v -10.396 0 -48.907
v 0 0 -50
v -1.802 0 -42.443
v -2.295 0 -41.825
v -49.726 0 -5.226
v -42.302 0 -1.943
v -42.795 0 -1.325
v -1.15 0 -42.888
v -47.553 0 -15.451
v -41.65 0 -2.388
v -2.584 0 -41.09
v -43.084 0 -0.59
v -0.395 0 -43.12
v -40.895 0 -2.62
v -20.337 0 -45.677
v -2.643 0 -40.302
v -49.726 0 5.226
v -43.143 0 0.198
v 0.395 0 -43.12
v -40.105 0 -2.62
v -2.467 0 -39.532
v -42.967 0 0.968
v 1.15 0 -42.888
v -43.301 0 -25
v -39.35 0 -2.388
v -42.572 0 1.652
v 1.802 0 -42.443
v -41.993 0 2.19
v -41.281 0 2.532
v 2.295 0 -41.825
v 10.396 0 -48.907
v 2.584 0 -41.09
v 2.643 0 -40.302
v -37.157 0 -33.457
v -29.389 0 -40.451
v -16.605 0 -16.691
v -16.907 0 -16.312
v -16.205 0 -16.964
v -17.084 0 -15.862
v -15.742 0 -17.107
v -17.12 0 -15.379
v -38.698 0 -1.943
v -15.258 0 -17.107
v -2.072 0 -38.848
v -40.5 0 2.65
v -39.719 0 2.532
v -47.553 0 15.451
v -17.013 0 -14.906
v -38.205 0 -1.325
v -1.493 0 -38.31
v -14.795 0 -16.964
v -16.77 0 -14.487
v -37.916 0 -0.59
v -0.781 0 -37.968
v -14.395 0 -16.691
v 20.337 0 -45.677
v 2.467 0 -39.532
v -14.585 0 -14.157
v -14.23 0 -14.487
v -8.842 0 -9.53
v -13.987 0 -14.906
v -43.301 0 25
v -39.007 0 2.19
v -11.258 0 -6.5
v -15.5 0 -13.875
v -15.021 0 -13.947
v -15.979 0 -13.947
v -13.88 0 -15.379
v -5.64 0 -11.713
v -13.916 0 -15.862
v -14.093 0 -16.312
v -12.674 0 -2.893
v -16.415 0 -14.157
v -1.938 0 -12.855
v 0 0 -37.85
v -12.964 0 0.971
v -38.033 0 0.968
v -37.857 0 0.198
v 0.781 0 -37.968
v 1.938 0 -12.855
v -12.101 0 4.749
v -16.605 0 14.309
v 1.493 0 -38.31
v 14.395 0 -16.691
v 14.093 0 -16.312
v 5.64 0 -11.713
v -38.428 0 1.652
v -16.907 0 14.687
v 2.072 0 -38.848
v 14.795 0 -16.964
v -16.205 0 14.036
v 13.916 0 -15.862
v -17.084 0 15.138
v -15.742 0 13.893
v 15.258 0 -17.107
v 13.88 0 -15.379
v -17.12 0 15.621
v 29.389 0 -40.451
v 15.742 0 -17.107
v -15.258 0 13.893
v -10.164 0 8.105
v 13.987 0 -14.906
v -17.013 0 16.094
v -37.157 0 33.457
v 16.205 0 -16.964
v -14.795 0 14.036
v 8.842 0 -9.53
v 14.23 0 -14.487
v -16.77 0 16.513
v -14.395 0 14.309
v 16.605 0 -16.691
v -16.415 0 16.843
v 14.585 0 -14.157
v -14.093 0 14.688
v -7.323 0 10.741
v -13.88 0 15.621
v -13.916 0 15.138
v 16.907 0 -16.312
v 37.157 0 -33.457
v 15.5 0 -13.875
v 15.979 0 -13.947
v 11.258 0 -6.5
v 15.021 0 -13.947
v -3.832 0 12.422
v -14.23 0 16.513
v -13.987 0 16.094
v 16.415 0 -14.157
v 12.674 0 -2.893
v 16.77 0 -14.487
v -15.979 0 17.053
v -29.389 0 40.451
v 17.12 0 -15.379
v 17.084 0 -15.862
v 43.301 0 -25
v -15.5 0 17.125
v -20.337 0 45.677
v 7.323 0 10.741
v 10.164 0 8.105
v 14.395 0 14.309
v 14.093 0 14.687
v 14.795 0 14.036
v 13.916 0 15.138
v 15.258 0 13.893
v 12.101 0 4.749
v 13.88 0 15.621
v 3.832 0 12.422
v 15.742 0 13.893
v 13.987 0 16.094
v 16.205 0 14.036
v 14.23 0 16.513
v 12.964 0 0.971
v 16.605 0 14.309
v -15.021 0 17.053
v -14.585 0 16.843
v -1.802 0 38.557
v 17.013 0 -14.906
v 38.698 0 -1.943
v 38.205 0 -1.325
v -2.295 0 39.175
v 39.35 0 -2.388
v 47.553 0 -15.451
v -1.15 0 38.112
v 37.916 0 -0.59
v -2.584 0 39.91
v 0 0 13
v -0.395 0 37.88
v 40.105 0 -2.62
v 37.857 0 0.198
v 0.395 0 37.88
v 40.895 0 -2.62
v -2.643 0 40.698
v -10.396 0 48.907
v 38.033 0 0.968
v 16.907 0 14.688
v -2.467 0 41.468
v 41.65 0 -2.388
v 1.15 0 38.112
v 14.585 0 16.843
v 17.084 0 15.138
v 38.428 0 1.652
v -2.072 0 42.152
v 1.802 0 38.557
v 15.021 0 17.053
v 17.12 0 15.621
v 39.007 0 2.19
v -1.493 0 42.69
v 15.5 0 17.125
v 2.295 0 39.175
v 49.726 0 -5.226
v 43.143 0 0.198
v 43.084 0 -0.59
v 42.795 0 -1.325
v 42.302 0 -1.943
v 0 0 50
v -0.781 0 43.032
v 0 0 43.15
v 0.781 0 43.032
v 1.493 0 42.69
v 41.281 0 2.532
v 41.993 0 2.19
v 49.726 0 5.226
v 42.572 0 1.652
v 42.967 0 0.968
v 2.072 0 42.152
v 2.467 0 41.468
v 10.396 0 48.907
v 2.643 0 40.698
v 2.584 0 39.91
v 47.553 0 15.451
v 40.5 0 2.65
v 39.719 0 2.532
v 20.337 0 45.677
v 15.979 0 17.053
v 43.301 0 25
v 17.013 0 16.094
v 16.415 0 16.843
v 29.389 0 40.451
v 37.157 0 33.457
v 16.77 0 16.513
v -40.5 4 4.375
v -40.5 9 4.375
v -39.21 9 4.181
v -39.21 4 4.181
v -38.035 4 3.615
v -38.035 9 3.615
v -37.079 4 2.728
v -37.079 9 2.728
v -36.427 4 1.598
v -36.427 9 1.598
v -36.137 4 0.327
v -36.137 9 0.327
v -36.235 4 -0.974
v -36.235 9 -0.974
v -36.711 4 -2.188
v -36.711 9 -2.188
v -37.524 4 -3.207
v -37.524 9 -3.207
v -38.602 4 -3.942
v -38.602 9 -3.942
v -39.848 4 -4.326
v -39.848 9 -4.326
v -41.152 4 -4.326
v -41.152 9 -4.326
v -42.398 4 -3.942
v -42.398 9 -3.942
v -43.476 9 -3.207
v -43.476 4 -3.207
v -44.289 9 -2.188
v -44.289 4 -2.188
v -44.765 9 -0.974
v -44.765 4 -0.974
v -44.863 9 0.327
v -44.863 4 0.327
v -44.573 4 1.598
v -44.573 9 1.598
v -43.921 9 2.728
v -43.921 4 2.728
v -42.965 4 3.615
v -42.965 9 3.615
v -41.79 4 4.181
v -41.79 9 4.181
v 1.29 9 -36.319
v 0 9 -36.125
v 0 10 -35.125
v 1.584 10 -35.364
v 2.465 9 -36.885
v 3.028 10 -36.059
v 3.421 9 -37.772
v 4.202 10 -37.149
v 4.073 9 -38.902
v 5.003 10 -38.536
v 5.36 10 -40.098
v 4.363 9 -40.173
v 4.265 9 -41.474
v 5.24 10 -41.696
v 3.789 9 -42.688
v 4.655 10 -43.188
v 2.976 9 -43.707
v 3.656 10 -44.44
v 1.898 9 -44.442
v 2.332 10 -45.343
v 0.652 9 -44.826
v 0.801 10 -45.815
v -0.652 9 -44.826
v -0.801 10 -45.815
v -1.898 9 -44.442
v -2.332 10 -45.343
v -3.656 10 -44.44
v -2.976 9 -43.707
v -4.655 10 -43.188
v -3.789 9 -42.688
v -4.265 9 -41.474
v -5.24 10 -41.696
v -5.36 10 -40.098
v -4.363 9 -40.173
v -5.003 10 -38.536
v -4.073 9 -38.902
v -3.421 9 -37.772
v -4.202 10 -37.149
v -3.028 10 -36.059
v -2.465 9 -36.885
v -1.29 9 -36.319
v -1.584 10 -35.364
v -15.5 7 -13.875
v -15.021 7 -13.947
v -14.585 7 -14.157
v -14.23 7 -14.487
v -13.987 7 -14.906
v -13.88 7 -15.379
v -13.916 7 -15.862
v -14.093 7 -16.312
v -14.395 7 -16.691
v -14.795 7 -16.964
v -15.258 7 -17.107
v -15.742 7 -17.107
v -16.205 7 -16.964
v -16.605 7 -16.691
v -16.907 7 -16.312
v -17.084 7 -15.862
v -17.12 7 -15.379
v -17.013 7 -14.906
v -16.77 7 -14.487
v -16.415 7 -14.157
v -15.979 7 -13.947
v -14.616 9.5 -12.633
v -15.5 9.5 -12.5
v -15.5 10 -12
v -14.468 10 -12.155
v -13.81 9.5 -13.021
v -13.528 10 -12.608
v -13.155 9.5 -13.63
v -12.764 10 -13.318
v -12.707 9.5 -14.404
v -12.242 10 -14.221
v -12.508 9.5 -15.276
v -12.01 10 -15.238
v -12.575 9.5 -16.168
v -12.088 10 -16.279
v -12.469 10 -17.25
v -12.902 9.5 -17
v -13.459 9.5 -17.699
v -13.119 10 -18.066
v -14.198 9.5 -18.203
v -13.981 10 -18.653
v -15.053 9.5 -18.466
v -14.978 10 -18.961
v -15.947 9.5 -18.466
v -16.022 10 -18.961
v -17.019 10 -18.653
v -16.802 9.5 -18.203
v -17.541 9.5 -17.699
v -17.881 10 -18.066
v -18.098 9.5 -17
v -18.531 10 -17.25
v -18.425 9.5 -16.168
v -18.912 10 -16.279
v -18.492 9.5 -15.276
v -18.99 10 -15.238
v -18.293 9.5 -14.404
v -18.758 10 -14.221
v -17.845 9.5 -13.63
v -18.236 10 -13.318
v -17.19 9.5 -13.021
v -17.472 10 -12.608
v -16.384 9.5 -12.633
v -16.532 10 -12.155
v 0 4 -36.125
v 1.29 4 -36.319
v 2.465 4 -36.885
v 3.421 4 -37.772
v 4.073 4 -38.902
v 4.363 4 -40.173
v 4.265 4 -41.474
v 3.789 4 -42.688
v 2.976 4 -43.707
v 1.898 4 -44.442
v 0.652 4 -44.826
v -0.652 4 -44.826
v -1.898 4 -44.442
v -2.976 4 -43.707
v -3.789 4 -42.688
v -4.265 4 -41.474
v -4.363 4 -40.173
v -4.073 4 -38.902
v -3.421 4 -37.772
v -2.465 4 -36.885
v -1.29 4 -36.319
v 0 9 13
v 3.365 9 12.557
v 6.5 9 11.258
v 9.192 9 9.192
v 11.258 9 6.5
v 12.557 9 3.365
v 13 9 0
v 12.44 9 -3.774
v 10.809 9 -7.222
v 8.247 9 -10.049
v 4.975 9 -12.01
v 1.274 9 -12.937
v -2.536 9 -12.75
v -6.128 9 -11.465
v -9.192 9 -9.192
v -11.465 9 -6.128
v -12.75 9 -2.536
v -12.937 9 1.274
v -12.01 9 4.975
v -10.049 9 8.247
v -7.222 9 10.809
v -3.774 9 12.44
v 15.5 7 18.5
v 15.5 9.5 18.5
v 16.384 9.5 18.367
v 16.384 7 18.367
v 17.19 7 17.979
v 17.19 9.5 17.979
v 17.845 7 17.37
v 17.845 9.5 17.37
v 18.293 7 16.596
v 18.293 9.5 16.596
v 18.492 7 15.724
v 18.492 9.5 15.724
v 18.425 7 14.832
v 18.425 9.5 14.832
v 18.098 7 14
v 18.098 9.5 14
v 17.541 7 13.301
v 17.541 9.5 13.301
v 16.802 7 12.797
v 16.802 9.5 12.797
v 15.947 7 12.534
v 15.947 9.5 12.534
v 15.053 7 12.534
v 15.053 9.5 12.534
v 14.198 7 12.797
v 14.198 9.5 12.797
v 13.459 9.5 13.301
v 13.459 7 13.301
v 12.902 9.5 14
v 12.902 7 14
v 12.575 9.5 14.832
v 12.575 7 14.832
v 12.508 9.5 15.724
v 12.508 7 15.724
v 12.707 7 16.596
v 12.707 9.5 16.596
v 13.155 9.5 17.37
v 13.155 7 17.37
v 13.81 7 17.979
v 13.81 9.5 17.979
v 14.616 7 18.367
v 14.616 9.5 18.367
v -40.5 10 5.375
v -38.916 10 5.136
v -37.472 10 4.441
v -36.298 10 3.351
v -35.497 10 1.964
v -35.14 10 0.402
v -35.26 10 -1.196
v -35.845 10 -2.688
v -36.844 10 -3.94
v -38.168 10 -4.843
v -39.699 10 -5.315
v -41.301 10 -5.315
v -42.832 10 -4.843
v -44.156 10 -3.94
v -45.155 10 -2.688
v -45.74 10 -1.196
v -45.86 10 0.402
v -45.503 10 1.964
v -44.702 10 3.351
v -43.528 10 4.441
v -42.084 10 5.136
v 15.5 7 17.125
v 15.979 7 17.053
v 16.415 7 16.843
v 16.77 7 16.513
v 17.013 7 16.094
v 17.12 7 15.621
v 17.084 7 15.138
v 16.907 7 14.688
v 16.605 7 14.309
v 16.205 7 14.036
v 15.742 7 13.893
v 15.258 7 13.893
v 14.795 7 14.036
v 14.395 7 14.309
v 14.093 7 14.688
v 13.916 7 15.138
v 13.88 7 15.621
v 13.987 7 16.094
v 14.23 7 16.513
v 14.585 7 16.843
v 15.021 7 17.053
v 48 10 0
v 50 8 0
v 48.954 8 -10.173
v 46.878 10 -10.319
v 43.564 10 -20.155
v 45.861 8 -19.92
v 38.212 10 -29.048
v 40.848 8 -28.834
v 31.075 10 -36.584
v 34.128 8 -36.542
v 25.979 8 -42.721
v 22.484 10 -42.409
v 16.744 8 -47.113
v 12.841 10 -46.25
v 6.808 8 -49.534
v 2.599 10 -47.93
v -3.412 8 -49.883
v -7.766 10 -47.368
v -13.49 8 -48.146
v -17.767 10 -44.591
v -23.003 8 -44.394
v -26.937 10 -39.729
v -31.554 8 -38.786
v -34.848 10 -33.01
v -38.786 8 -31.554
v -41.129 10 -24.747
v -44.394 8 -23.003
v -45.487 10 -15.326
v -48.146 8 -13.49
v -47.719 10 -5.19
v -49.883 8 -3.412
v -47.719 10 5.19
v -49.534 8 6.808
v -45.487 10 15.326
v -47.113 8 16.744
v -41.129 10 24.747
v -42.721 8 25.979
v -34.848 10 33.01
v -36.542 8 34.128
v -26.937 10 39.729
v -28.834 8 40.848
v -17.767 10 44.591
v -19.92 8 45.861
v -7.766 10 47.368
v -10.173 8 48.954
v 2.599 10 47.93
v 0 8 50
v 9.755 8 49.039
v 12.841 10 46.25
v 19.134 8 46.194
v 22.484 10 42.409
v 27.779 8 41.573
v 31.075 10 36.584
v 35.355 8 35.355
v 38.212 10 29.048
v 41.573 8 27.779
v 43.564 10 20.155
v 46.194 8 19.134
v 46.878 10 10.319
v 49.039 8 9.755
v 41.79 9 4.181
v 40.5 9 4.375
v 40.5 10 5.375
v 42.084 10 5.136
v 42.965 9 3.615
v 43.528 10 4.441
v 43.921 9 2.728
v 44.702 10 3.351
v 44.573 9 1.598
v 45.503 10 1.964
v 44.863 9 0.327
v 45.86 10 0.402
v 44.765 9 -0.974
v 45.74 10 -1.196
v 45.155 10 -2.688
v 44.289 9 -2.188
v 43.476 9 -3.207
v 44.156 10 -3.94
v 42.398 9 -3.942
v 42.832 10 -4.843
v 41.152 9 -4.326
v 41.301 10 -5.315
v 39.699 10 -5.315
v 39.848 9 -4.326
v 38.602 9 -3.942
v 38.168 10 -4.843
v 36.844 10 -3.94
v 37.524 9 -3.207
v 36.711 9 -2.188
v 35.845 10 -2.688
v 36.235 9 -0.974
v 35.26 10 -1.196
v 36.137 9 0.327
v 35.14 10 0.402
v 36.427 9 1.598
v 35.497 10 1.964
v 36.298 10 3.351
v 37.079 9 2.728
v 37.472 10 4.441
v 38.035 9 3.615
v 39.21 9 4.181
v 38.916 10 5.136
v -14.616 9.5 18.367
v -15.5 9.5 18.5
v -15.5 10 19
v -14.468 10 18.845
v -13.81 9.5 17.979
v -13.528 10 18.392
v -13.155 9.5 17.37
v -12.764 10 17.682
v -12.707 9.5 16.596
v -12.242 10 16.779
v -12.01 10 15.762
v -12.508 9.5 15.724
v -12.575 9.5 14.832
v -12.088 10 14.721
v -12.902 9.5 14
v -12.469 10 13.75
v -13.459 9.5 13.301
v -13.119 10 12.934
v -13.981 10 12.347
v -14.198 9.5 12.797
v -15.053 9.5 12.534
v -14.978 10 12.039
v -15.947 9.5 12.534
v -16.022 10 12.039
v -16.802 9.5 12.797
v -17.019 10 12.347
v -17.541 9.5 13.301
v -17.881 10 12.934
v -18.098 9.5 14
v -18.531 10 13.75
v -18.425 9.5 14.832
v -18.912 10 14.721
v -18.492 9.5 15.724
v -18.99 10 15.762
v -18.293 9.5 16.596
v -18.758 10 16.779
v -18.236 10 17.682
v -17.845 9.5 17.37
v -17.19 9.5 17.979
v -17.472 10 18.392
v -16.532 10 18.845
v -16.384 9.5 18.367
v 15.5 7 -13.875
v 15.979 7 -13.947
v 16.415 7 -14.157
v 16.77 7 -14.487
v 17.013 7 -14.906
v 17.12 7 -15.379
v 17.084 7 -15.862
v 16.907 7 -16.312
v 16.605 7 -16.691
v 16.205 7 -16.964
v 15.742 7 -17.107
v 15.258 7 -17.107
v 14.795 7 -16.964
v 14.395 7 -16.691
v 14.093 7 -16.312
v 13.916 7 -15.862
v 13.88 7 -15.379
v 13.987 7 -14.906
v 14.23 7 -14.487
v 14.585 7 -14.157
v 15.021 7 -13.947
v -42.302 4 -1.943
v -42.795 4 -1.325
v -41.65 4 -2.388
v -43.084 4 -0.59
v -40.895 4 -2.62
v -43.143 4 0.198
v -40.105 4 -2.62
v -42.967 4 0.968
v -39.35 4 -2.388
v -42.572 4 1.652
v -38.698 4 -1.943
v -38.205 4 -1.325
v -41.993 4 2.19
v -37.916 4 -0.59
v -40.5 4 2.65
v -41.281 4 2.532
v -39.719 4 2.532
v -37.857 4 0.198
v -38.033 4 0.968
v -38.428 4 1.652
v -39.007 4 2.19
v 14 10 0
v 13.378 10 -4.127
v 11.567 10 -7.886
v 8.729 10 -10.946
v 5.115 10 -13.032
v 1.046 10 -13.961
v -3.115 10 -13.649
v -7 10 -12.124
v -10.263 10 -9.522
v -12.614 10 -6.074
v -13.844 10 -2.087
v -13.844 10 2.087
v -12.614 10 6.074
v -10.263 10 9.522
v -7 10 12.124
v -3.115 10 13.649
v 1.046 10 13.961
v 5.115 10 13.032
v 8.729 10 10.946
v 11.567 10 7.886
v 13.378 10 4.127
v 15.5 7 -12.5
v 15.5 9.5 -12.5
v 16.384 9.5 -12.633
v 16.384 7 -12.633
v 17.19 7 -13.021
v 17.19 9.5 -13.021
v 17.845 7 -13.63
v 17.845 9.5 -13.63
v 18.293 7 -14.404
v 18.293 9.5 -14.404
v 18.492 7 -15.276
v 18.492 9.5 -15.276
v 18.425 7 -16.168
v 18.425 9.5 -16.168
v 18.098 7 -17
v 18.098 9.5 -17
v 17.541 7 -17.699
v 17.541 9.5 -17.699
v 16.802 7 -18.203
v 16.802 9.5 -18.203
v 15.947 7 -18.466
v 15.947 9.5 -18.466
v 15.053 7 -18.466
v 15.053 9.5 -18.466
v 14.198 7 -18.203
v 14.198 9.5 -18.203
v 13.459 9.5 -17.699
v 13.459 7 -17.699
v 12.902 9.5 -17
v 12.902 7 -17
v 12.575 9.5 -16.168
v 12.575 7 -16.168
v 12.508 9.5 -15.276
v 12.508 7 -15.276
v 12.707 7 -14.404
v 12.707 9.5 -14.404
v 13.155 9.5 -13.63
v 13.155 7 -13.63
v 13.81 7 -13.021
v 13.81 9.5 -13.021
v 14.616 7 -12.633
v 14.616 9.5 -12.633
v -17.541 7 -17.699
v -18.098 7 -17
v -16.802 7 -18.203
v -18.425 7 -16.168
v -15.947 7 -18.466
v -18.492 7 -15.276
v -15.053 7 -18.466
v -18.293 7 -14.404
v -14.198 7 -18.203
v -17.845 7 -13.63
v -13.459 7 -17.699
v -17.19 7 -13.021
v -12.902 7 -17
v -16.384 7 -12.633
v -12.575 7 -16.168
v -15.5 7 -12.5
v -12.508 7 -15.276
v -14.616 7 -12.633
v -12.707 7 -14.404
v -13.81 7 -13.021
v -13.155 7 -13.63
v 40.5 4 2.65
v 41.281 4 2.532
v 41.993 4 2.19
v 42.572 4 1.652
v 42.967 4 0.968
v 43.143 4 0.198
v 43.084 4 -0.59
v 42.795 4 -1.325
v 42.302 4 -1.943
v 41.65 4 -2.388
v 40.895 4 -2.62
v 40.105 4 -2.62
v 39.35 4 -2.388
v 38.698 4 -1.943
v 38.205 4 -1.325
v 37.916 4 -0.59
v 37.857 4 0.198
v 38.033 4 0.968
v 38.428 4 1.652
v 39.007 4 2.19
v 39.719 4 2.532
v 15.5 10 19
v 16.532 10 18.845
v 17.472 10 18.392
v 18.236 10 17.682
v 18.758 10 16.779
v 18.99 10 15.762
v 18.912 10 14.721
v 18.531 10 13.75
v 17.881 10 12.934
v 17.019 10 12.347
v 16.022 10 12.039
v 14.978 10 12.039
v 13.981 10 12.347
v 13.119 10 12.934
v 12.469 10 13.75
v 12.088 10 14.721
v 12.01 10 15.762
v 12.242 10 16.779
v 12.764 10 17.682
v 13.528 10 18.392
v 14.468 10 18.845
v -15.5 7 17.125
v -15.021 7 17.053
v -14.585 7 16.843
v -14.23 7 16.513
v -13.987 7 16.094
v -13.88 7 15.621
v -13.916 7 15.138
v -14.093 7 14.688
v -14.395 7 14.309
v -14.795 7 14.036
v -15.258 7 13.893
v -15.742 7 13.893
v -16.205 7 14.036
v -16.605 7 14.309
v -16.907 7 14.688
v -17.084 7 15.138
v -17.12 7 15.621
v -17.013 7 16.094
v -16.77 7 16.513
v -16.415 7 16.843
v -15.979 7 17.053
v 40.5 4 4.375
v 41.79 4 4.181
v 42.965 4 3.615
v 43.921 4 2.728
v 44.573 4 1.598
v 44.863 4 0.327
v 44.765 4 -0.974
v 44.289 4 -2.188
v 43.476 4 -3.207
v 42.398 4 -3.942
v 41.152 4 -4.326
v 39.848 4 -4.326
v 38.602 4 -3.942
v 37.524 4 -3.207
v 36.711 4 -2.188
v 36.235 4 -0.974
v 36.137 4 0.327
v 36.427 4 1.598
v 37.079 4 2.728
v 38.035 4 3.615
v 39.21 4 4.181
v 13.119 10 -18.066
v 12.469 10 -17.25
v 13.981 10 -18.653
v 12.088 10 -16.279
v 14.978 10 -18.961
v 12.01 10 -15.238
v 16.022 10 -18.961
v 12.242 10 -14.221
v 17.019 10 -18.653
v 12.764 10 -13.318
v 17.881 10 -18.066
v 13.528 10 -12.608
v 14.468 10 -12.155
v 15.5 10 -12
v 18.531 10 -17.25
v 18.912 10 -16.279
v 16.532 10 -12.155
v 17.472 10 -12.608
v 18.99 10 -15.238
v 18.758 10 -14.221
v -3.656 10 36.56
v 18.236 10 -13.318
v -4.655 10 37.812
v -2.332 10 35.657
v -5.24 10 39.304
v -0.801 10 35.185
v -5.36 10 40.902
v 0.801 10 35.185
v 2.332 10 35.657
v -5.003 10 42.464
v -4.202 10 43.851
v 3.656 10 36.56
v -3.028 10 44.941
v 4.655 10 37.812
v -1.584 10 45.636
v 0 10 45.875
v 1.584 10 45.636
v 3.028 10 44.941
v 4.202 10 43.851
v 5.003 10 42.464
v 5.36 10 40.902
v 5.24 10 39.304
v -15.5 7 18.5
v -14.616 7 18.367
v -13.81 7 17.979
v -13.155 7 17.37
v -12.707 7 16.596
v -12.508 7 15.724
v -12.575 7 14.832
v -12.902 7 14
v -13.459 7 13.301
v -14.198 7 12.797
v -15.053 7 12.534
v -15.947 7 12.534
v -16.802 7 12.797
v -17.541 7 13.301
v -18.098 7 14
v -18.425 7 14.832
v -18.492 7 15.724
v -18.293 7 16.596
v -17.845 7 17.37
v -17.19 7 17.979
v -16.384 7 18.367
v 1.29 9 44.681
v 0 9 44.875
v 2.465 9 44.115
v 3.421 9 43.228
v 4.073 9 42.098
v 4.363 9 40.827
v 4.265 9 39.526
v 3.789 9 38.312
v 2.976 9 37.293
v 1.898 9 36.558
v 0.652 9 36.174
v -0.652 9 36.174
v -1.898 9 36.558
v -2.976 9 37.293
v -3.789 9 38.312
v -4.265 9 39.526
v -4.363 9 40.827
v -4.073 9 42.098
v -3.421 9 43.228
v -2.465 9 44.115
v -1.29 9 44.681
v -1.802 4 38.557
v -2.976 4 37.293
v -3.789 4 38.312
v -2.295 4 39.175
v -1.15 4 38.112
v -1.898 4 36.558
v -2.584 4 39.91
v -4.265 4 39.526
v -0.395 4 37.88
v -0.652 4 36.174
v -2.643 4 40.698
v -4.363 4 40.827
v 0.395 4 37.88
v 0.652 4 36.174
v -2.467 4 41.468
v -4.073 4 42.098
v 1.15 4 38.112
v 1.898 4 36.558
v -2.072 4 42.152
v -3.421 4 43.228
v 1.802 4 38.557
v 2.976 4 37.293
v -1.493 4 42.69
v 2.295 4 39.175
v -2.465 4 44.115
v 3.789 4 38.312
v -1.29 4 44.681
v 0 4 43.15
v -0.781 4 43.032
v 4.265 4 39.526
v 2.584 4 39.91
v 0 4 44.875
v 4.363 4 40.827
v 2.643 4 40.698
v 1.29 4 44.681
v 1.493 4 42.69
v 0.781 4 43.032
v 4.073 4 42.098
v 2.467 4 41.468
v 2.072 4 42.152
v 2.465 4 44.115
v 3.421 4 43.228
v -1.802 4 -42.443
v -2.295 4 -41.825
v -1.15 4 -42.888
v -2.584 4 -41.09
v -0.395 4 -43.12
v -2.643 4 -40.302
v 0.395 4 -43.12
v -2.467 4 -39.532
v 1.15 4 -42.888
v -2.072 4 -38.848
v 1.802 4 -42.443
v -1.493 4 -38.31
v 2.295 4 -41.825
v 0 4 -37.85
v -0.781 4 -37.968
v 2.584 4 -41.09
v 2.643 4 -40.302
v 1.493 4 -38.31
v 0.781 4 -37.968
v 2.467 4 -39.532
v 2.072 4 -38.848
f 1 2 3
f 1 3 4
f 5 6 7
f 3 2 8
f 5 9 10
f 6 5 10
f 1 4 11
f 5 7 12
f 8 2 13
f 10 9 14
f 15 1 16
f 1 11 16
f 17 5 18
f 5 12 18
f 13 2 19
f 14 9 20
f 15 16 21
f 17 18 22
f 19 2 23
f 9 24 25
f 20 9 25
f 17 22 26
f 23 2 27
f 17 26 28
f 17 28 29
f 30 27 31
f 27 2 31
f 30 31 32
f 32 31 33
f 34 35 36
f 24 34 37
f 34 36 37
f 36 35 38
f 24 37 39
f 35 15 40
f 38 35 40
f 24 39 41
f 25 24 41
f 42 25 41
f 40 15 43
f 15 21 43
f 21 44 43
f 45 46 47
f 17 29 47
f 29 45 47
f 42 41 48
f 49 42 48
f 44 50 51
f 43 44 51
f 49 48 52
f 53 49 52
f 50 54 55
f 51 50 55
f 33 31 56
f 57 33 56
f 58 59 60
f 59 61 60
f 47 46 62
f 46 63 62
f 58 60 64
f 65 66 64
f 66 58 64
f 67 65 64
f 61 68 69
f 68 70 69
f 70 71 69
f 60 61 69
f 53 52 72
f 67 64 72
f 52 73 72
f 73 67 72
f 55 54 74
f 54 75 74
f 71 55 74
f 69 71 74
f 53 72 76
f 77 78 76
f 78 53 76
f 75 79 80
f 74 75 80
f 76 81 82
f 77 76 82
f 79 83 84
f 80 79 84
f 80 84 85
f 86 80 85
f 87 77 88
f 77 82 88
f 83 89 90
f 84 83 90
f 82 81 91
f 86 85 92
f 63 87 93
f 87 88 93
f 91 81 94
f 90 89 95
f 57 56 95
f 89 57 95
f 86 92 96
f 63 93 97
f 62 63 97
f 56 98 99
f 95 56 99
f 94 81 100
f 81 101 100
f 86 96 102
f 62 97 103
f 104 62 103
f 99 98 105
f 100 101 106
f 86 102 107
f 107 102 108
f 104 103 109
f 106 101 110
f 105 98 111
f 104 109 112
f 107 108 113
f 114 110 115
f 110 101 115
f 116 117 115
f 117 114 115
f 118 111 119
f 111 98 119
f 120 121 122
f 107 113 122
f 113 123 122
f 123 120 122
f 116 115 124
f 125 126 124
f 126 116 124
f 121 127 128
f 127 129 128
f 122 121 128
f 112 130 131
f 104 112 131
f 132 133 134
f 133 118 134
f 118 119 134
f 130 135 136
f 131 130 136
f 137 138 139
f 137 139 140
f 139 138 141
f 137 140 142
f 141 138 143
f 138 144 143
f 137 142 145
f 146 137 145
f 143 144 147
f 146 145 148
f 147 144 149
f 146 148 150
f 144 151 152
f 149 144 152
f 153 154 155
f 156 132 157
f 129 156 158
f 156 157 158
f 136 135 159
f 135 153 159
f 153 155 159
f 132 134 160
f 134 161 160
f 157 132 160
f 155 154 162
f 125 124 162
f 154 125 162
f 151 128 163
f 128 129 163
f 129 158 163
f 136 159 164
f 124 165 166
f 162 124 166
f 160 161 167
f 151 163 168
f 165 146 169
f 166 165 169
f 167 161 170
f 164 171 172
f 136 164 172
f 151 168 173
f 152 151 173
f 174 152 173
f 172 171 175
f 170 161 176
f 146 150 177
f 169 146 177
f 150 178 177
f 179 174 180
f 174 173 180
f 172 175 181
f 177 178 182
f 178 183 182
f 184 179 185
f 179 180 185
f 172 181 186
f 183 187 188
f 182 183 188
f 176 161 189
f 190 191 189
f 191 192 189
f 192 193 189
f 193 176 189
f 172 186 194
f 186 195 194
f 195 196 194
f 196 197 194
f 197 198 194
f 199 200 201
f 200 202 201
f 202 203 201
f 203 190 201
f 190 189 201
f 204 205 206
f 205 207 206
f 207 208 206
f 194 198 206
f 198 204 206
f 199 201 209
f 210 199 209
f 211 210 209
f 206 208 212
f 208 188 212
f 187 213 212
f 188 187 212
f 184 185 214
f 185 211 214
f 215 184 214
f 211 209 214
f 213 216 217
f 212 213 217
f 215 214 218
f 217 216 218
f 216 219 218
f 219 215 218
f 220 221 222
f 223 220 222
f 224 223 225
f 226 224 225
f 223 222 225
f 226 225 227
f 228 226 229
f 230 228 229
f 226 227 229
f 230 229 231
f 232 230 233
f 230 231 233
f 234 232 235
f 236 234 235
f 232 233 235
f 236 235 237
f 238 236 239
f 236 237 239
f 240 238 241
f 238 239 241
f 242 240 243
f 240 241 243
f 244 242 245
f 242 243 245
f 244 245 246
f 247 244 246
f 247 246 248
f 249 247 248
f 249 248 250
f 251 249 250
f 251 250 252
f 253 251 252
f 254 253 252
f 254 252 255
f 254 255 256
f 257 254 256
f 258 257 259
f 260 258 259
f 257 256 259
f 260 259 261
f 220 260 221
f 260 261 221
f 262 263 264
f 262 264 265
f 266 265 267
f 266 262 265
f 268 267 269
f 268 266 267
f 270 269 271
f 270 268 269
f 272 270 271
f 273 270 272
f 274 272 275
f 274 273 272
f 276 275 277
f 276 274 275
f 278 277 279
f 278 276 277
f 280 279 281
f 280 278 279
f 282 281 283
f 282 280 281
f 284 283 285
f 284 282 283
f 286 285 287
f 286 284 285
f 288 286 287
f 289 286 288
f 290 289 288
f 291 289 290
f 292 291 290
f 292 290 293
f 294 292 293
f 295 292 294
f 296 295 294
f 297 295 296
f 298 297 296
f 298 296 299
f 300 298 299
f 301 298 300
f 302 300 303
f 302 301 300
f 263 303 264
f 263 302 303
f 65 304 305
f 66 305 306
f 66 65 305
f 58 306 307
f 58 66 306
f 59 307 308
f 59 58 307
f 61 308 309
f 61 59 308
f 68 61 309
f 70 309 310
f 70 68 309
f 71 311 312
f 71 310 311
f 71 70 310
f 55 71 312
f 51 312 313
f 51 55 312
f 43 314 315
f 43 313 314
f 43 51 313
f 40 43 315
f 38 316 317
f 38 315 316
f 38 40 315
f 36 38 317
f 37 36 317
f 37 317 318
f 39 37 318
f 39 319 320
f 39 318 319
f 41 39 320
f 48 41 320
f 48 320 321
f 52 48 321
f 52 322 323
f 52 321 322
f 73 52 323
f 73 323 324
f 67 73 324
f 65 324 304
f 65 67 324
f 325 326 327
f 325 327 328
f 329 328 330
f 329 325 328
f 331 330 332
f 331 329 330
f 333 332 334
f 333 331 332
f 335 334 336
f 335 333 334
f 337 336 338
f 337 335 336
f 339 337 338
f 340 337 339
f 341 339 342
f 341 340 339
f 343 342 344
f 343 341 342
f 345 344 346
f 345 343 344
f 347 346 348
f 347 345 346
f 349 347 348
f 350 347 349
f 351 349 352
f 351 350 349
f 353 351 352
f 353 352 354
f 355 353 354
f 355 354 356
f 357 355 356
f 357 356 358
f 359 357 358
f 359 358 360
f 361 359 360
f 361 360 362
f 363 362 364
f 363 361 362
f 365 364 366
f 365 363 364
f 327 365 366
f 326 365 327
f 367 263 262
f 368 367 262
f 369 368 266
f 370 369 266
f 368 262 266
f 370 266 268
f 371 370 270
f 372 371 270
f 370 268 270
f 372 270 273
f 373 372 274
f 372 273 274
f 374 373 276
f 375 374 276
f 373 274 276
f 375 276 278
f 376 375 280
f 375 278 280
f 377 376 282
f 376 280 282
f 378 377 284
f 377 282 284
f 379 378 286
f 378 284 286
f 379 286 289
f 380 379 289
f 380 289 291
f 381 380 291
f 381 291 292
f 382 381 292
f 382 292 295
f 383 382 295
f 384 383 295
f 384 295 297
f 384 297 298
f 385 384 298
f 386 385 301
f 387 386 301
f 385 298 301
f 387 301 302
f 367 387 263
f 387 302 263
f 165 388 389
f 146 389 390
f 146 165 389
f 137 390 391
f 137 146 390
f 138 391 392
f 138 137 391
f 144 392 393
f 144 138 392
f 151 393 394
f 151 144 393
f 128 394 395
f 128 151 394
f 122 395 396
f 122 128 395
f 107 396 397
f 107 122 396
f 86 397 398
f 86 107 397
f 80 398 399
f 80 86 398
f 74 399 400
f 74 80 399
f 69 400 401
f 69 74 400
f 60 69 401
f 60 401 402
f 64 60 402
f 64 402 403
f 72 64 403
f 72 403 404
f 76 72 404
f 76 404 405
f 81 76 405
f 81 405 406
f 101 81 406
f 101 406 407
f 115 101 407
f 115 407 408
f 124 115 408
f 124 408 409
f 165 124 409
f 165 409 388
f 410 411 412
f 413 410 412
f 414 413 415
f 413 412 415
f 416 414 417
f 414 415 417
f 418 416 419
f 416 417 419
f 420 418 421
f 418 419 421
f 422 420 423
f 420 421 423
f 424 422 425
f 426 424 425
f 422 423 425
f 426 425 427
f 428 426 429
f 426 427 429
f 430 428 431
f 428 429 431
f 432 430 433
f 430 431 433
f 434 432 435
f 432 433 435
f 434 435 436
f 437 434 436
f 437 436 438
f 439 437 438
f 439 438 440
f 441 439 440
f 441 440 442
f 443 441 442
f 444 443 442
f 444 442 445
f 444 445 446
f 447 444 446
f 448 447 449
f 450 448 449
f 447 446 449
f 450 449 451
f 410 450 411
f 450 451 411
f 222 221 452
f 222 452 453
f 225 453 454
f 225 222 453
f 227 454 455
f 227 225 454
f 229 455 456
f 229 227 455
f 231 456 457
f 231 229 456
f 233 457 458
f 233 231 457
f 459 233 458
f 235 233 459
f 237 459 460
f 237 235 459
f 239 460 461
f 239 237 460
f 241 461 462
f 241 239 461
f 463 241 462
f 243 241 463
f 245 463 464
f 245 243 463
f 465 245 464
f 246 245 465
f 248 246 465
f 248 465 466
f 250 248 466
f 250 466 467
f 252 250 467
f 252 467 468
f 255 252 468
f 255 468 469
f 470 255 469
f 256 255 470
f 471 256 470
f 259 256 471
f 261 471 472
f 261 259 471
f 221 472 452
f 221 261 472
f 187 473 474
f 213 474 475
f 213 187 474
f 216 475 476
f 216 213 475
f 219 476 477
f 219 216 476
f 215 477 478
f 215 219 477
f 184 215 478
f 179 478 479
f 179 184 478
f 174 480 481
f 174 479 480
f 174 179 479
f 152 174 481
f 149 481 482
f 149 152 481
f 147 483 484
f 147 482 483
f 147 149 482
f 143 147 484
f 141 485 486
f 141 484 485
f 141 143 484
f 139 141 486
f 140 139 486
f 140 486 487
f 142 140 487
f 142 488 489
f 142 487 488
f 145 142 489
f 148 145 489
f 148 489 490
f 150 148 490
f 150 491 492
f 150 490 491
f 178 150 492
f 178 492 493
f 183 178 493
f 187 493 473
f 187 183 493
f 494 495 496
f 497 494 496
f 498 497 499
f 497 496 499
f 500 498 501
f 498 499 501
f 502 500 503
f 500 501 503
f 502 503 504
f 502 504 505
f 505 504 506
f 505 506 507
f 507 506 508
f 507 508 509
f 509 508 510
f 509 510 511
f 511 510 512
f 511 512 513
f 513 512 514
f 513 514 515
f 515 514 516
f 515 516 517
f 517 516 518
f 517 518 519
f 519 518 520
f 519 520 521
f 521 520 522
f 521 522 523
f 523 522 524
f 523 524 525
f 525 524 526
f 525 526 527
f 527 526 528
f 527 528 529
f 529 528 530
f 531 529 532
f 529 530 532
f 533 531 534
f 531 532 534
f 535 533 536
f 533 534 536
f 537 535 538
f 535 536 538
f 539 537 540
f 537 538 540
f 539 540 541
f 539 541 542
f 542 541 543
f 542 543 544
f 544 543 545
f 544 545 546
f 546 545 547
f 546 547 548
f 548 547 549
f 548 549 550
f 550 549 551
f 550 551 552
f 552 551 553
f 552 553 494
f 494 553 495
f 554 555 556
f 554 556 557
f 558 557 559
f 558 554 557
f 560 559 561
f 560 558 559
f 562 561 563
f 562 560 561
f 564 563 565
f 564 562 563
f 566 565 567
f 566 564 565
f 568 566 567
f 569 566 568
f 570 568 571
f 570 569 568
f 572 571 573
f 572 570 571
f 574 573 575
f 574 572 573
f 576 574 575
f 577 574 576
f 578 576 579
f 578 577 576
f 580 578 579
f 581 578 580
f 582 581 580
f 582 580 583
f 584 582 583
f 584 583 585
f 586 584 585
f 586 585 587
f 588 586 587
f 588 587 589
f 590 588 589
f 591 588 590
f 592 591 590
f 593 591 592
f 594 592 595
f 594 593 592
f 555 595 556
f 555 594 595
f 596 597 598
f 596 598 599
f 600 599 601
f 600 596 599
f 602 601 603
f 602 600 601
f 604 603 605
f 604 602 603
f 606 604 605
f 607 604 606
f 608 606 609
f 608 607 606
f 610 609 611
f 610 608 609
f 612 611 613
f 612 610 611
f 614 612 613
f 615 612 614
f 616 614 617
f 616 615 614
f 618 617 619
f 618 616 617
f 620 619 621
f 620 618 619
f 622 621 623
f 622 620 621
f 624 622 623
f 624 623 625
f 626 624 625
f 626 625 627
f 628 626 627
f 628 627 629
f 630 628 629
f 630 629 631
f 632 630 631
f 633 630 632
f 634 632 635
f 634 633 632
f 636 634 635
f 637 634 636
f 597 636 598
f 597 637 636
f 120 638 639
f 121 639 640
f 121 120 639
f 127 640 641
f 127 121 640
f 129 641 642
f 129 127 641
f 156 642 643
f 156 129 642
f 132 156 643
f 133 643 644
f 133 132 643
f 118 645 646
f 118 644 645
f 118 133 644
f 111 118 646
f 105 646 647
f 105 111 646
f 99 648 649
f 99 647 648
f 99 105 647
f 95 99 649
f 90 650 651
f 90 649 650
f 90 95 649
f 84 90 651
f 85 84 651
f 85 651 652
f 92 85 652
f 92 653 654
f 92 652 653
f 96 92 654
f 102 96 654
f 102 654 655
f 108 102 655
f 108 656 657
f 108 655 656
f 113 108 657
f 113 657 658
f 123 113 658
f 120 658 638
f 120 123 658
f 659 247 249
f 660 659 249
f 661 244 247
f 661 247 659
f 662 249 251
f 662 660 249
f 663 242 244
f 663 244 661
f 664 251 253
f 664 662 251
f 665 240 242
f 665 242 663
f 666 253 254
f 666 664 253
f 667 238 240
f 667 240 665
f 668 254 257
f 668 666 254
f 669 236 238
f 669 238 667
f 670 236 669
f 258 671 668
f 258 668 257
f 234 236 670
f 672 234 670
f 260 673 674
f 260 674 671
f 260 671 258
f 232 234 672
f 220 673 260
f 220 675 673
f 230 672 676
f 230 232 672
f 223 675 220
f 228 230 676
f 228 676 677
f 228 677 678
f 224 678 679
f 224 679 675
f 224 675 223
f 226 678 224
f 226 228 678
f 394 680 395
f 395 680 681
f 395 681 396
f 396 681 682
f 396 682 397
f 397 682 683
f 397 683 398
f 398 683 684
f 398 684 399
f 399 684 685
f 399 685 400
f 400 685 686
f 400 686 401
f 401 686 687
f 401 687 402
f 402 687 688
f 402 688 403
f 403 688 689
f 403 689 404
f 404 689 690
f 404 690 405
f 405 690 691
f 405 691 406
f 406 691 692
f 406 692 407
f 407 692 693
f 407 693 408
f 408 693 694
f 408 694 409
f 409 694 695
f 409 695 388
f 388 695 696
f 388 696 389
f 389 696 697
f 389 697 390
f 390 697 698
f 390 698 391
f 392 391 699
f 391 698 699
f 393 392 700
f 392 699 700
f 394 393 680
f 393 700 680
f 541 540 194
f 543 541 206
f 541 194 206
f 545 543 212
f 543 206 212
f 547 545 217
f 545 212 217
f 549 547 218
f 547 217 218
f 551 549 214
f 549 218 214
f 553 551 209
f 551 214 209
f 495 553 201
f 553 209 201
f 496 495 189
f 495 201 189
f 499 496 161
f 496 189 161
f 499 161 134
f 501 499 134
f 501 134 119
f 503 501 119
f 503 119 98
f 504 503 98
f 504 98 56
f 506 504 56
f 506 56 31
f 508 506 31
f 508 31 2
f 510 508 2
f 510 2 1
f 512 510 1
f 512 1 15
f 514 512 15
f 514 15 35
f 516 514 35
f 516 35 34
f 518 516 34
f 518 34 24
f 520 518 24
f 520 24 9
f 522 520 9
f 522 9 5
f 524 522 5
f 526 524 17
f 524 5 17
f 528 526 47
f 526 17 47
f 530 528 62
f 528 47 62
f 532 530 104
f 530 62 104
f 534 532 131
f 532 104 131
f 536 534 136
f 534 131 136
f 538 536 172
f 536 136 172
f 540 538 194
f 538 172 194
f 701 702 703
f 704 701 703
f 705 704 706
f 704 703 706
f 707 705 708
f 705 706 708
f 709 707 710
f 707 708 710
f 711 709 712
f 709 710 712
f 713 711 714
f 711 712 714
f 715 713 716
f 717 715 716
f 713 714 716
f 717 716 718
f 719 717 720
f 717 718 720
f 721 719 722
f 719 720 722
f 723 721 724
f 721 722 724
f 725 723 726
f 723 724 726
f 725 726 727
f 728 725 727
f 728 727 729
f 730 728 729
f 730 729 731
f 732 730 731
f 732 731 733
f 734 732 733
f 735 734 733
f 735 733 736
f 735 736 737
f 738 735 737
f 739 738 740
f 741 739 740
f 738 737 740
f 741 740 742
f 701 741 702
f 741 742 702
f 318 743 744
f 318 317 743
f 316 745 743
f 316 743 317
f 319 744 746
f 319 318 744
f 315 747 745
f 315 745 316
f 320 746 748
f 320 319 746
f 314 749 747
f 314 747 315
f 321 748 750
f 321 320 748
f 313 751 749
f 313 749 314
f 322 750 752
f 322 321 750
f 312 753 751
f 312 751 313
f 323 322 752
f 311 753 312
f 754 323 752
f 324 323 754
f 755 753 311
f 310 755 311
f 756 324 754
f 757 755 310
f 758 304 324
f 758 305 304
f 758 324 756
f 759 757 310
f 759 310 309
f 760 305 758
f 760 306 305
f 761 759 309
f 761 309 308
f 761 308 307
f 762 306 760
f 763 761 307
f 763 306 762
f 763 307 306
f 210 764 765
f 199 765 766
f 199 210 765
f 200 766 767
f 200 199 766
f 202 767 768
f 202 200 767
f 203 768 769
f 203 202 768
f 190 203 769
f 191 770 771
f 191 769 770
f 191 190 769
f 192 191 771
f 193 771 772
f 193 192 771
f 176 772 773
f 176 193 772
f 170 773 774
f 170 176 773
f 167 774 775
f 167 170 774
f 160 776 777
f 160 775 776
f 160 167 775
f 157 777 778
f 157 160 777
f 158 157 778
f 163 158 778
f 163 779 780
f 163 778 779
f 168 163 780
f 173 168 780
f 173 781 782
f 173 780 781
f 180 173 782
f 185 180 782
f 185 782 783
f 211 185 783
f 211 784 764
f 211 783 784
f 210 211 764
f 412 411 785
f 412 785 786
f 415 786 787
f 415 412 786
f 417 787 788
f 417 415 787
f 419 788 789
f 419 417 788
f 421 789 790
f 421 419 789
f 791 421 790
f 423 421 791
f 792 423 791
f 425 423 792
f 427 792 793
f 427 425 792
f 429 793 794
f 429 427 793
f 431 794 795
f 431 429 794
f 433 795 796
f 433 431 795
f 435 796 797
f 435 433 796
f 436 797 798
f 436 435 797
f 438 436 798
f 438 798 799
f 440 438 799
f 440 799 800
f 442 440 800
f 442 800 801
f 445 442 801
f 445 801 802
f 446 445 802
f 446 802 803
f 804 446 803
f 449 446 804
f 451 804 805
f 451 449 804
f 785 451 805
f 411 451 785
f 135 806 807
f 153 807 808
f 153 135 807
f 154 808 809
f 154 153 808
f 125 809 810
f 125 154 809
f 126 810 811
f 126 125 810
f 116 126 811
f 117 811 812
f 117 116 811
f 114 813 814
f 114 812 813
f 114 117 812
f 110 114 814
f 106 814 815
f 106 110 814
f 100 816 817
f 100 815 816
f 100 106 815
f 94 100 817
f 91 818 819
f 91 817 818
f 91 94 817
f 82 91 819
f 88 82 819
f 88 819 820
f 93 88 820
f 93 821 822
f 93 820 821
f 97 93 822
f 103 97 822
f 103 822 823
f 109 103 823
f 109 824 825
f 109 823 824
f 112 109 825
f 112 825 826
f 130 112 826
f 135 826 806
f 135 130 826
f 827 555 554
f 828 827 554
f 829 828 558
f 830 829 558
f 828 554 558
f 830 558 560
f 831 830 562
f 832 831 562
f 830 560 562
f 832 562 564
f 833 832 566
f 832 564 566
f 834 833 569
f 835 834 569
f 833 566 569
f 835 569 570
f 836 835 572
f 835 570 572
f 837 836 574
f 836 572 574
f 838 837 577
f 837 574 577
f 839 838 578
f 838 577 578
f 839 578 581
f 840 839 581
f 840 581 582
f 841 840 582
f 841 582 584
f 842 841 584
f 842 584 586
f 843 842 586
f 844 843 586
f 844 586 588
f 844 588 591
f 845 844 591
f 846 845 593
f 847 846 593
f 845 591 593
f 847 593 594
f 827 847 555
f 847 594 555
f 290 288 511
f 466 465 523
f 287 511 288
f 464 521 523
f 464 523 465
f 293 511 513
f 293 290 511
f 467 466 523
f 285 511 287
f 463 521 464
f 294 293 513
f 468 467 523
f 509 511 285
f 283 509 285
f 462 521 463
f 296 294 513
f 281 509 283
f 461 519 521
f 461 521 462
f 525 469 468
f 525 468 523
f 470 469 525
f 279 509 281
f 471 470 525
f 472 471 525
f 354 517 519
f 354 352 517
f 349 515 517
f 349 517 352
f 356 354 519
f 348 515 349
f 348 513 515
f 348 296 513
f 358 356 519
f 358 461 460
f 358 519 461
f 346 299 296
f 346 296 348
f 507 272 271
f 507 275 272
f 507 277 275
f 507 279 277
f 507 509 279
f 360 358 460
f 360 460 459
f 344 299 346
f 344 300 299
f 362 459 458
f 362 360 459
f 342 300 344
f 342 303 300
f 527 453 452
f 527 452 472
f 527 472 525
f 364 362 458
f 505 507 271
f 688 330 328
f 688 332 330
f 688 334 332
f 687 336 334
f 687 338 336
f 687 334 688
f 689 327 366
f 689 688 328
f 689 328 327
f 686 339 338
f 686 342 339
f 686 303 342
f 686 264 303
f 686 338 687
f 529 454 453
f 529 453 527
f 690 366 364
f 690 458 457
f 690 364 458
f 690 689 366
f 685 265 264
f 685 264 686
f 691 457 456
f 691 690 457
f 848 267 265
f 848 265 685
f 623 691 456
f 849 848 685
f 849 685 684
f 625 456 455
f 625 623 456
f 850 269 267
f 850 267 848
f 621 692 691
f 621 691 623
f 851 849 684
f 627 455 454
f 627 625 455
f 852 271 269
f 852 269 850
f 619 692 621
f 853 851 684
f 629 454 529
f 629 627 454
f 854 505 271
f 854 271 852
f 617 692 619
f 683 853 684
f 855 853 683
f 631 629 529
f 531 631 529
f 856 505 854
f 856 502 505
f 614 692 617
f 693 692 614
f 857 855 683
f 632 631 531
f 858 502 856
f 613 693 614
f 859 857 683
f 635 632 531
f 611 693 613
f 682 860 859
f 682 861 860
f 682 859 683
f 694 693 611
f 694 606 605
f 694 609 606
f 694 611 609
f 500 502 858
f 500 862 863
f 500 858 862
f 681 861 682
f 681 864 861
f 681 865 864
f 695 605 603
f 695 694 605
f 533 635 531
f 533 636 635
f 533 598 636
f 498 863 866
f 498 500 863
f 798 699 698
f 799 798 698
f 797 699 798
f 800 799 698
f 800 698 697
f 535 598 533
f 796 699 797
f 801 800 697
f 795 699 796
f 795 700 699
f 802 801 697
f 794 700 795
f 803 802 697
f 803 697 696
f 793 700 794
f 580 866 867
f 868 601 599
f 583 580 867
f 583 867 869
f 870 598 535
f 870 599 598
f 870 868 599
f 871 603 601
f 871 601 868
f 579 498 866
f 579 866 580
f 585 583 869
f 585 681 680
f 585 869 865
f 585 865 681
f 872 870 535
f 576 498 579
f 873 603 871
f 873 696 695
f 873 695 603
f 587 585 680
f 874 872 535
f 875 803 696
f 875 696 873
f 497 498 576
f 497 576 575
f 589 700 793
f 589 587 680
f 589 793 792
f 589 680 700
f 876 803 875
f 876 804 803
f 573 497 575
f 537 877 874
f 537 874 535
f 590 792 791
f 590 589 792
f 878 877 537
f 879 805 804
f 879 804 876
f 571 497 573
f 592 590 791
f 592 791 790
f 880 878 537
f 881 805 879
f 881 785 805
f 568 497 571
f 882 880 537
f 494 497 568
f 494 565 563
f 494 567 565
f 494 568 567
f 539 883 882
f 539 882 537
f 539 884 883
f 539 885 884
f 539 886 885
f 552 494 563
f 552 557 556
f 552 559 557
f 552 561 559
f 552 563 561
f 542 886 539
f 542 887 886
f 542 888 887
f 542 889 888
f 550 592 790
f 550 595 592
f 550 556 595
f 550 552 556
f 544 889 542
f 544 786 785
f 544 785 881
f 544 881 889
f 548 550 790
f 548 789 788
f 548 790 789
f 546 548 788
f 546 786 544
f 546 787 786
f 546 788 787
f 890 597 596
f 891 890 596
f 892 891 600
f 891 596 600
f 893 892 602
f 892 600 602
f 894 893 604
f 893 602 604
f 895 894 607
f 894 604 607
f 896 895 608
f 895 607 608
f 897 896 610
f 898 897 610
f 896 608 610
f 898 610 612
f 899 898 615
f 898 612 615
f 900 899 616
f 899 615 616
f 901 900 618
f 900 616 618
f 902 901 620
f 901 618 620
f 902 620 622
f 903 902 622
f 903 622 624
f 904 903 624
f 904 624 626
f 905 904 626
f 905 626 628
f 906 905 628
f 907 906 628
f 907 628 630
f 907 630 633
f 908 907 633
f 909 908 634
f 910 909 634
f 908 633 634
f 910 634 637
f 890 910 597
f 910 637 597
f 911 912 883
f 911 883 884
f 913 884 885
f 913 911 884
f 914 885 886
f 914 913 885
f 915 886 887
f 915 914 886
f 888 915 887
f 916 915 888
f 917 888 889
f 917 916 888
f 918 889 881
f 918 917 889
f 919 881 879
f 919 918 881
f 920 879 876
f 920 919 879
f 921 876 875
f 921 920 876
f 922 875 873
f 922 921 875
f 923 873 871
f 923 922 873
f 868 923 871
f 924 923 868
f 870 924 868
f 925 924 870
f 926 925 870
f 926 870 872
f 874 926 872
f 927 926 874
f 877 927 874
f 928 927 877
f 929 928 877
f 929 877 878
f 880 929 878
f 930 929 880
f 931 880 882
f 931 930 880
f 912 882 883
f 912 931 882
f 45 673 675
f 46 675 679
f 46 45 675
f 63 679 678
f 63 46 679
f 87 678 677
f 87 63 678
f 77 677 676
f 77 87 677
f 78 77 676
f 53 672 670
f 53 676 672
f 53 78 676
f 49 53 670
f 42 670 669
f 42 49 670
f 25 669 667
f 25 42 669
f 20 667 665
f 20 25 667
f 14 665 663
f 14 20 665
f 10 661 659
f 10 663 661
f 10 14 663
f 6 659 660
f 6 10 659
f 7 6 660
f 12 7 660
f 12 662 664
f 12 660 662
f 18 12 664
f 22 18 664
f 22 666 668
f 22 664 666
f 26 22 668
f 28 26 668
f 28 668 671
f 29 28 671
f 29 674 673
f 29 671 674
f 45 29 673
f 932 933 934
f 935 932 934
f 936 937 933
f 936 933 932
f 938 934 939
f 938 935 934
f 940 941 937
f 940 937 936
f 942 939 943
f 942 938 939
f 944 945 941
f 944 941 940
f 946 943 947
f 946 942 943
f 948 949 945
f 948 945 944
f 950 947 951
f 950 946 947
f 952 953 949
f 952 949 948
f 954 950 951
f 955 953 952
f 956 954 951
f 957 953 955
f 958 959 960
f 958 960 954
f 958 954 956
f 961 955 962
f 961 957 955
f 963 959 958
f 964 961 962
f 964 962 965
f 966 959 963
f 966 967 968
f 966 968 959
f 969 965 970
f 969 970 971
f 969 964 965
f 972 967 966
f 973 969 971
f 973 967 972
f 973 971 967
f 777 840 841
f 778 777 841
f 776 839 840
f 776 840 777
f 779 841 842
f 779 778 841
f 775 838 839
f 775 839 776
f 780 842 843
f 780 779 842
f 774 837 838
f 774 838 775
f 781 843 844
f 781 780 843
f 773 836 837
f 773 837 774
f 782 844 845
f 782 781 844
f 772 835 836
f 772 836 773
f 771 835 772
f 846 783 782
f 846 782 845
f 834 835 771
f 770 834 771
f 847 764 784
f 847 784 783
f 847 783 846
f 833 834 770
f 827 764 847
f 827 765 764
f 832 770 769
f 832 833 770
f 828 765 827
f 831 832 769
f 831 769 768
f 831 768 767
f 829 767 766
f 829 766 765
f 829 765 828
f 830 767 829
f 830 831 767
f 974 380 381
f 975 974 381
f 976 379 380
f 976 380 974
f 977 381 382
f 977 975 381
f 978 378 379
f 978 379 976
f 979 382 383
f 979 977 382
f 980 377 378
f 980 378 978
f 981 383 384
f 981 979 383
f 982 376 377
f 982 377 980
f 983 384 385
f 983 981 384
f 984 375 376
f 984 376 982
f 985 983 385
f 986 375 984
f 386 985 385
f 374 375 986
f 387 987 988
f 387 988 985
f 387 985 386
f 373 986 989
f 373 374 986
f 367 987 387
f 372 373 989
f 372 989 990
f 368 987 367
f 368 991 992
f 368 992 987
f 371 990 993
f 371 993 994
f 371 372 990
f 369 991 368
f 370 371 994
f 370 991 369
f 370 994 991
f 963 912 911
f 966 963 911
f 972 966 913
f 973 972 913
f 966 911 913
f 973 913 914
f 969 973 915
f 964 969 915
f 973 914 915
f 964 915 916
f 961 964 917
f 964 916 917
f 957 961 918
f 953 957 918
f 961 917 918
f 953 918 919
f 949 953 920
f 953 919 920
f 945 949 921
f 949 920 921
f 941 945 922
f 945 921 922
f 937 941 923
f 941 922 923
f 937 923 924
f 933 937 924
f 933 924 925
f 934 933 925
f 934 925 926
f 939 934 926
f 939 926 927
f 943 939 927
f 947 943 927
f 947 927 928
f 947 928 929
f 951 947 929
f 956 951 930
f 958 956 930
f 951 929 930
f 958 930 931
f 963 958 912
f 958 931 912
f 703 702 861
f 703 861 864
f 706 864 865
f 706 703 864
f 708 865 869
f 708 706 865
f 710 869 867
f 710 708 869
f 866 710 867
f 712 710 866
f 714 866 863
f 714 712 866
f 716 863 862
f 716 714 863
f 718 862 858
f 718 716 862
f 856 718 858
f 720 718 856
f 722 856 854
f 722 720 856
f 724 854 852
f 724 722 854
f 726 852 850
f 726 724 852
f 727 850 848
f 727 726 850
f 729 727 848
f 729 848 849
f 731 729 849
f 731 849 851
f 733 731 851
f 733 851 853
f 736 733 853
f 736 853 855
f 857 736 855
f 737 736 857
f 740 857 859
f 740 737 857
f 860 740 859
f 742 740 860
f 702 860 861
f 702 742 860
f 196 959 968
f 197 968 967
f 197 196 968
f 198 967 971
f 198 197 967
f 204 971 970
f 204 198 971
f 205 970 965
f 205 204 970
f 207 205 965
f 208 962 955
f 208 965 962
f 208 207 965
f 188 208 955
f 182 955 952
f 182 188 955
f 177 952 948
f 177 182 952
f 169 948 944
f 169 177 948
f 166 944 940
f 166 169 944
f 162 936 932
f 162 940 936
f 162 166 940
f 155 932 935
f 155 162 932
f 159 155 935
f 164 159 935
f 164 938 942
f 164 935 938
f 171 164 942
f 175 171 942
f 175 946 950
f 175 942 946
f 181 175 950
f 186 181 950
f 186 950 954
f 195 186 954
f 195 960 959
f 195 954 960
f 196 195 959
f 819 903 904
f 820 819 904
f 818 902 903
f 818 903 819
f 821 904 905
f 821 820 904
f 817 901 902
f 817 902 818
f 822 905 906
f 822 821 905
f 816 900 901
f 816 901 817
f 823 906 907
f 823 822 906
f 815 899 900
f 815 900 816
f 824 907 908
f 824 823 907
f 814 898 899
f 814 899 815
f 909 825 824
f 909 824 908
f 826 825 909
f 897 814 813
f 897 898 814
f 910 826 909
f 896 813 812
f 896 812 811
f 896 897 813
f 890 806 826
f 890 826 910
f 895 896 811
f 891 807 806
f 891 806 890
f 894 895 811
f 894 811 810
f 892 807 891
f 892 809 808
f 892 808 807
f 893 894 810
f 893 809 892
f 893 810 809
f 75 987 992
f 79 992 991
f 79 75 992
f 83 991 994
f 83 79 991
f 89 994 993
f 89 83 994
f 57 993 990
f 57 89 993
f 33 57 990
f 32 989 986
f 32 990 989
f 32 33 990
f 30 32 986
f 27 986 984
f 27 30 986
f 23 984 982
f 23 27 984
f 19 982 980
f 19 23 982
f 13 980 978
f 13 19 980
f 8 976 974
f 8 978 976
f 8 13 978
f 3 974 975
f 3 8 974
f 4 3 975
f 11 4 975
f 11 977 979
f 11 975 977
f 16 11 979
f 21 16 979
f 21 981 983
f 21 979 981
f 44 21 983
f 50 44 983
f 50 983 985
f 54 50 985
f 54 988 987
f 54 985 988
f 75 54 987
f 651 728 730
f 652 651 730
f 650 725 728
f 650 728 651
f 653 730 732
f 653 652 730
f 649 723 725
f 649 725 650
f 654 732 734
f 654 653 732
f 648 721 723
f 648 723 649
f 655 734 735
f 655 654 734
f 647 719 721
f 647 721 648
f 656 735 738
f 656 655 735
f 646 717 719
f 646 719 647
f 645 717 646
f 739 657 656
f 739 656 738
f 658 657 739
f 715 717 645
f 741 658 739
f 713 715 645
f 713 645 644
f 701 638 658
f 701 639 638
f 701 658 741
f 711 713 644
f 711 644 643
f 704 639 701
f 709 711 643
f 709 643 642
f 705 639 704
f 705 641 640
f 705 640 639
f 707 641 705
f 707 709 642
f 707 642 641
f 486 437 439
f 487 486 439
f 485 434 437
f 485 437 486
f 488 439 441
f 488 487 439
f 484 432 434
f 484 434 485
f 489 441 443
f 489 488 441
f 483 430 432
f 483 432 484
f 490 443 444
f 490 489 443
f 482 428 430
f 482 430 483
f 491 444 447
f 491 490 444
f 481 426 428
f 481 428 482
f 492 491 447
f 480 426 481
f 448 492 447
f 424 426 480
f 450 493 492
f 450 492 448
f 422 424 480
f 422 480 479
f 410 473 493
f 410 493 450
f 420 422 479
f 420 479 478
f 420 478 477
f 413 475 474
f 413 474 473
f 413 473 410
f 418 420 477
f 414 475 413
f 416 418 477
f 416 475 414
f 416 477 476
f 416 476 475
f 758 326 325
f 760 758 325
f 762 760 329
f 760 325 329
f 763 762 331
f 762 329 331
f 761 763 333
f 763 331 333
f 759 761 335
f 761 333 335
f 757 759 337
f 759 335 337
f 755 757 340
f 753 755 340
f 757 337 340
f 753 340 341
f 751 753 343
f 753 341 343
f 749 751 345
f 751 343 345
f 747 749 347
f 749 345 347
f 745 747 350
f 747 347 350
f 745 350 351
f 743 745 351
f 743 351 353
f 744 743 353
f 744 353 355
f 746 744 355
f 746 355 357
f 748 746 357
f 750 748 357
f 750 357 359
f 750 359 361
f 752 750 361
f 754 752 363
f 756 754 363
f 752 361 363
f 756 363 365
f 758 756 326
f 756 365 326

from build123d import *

# Parameters (mm, degrees)
SKETCH1_R           = 50
SKETCH1_R_2         = 13
SKETCH1_R_3         = 1.625
SKETCH1_R_4         = 2.65
BOSS_EXTRUDE1_DEPTH = 10
SKETCH2_R           = 3
CUT_EXTRUDE1_DEPTH  = 3
SKETCH3_R           = 4.375
CUT_EXTRUDE2_DEPTH  = 6
CHAMFER3_SIZE       = 1
CHAMFER4_SIZE       = 0.5


with BuildPart() as part:
    # Sketch1 → Boss-Extrude1 (new body)
    with BuildSketch(Plane(origin=(0, 0, 0), x_dir=(1, 0, 0), z_dir=(0, 1, 0))):
        with Locations(Location((0, 0, 0), (0, 0, 270))):
            Circle(SKETCH1_R)
        with Locations(Location((0, 0, 0), (0, 0, 270))):
            Circle(SKETCH1_R_2, mode=Mode.SUBTRACT)
        with Locations(Location((15.5, 15.5, 0), (0, 0, 270))):
            Circle(SKETCH1_R_3, mode=Mode.SUBTRACT)
        with Locations(Location((15.5, -15.5, 0), (0, 0, 270))):
            Circle(SKETCH1_R_3, mode=Mode.SUBTRACT)
        with Locations(Location((-15.5, -15.5, 0), (0, 0, 270))):
            Circle(SKETCH1_R_3, mode=Mode.SUBTRACT)
        with Locations(Location((-15.5, 15.5, 0), (0, 0, 270))):
            Circle(SKETCH1_R_3, mode=Mode.SUBTRACT)
        with Locations(Location((40.5, 0, 0), (0, 0, 270))):
            Circle(SKETCH1_R_4, mode=Mode.SUBTRACT)
        with Locations(Location((0, -40.5, 0), (0, 0, 270))):
            Circle(SKETCH1_R_4, mode=Mode.SUBTRACT)
        with Locations(Location((-40.5, 0, 0), (0, 0, 270))):
            Circle(SKETCH1_R_4, mode=Mode.SUBTRACT)
        with Locations(Location((0, 40.5, 0), (0, 0, 270))):
            Circle(SKETCH1_R_4, mode=Mode.SUBTRACT)
    extrude(amount=BOSS_EXTRUDE1_DEPTH)

    # Chamfer1: read off the stored shape, not the designer's step
    # Chamfer1 outline → Chamfer1 (revolve, cut)
    with BuildSketch(Plane.XY):
        Polygon((50, 10), (48, 10), (50, 8), align=None)
    revolve(axis=Axis((0, 0, 0), (0, 1, 0)), mode=Mode.SUBTRACT)

    # Sketch2 → Cut-Extrude1 (cut)
    with BuildSketch(Plane(origin=(0, 10, 0), x_dir=(1, 0, 0), z_dir=(0, 1, 0))):
        with Locations(Location((-15.5, 15.5, 0), (0, 0, 270))):
            Circle(SKETCH2_R)
        with Locations(Location((15.5, 15.5, 0), (0, 0, 270))):
            Circle(SKETCH2_R)
        with Locations(Location((15.5, -15.5, 0), (0, 0, 270))):
            Circle(SKETCH2_R)
        with Locations(Location((-15.5, -15.5, 0), (0, 0, 270))):
            Circle(SKETCH2_R)
    extrude(amount=-CUT_EXTRUDE1_DEPTH, mode=Mode.SUBTRACT)

    # Chamfer2: read off the stored shape, not the designer's step
    # Chamfer2 outline → Chamfer2 (revolve, cut)
    with BuildSketch(Plane.XY):
        Polygon((13, 10), (13, 9), (14, 10), align=None)
    revolve(axis=Axis((0, 0, 0), (0, 1, 0)), mode=Mode.SUBTRACT)

    # Sketch3 → Cut-Extrude2 (cut)
    with BuildSketch(Plane(origin=(0, 10, 0), x_dir=(1, 0, 0), z_dir=(0, 1, 0))):
        with Locations(Location((40.5, 0, 0), (0, 0, 270))):
            Circle(SKETCH3_R)
        with Locations(Location((0, -40.5, 0), (0, 0, 270))):
            Circle(SKETCH3_R)
        with Locations(Location((-40.5, 0, 0), (0, 0, 270))):
            Circle(SKETCH3_R)
        with Locations(Location((0, 40.5, 0), (0, 0, 270))):
            Circle(SKETCH3_R)
    extrude(amount=-CUT_EXTRUDE2_DEPTH, mode=Mode.SUBTRACT)

    # Chamfer3
    chamfer3_edges = [part.edges().sort_by_distance(p)[0] for p in [
        (40.5, 10, -4.375),
        (0, 10, 36.125),
        (-40.5, 10, -4.375),
        (0, 10, -44.875),
    ]]
    chamfer(chamfer3_edges, length=CHAMFER3_SIZE)

    # Chamfer4
    chamfer4_edges = [part.edges().sort_by_distance(p)[0] for p in [
        (-15.5, 10, 12.5),
        (15.5, 10, 12.5),
        (15.5, 10, -18.5),
        (-15.5, 10, -18.5),
    ]]
    chamfer(chamfer4_edges, length=CHAMFER4_SIZE)


solid = part.part
